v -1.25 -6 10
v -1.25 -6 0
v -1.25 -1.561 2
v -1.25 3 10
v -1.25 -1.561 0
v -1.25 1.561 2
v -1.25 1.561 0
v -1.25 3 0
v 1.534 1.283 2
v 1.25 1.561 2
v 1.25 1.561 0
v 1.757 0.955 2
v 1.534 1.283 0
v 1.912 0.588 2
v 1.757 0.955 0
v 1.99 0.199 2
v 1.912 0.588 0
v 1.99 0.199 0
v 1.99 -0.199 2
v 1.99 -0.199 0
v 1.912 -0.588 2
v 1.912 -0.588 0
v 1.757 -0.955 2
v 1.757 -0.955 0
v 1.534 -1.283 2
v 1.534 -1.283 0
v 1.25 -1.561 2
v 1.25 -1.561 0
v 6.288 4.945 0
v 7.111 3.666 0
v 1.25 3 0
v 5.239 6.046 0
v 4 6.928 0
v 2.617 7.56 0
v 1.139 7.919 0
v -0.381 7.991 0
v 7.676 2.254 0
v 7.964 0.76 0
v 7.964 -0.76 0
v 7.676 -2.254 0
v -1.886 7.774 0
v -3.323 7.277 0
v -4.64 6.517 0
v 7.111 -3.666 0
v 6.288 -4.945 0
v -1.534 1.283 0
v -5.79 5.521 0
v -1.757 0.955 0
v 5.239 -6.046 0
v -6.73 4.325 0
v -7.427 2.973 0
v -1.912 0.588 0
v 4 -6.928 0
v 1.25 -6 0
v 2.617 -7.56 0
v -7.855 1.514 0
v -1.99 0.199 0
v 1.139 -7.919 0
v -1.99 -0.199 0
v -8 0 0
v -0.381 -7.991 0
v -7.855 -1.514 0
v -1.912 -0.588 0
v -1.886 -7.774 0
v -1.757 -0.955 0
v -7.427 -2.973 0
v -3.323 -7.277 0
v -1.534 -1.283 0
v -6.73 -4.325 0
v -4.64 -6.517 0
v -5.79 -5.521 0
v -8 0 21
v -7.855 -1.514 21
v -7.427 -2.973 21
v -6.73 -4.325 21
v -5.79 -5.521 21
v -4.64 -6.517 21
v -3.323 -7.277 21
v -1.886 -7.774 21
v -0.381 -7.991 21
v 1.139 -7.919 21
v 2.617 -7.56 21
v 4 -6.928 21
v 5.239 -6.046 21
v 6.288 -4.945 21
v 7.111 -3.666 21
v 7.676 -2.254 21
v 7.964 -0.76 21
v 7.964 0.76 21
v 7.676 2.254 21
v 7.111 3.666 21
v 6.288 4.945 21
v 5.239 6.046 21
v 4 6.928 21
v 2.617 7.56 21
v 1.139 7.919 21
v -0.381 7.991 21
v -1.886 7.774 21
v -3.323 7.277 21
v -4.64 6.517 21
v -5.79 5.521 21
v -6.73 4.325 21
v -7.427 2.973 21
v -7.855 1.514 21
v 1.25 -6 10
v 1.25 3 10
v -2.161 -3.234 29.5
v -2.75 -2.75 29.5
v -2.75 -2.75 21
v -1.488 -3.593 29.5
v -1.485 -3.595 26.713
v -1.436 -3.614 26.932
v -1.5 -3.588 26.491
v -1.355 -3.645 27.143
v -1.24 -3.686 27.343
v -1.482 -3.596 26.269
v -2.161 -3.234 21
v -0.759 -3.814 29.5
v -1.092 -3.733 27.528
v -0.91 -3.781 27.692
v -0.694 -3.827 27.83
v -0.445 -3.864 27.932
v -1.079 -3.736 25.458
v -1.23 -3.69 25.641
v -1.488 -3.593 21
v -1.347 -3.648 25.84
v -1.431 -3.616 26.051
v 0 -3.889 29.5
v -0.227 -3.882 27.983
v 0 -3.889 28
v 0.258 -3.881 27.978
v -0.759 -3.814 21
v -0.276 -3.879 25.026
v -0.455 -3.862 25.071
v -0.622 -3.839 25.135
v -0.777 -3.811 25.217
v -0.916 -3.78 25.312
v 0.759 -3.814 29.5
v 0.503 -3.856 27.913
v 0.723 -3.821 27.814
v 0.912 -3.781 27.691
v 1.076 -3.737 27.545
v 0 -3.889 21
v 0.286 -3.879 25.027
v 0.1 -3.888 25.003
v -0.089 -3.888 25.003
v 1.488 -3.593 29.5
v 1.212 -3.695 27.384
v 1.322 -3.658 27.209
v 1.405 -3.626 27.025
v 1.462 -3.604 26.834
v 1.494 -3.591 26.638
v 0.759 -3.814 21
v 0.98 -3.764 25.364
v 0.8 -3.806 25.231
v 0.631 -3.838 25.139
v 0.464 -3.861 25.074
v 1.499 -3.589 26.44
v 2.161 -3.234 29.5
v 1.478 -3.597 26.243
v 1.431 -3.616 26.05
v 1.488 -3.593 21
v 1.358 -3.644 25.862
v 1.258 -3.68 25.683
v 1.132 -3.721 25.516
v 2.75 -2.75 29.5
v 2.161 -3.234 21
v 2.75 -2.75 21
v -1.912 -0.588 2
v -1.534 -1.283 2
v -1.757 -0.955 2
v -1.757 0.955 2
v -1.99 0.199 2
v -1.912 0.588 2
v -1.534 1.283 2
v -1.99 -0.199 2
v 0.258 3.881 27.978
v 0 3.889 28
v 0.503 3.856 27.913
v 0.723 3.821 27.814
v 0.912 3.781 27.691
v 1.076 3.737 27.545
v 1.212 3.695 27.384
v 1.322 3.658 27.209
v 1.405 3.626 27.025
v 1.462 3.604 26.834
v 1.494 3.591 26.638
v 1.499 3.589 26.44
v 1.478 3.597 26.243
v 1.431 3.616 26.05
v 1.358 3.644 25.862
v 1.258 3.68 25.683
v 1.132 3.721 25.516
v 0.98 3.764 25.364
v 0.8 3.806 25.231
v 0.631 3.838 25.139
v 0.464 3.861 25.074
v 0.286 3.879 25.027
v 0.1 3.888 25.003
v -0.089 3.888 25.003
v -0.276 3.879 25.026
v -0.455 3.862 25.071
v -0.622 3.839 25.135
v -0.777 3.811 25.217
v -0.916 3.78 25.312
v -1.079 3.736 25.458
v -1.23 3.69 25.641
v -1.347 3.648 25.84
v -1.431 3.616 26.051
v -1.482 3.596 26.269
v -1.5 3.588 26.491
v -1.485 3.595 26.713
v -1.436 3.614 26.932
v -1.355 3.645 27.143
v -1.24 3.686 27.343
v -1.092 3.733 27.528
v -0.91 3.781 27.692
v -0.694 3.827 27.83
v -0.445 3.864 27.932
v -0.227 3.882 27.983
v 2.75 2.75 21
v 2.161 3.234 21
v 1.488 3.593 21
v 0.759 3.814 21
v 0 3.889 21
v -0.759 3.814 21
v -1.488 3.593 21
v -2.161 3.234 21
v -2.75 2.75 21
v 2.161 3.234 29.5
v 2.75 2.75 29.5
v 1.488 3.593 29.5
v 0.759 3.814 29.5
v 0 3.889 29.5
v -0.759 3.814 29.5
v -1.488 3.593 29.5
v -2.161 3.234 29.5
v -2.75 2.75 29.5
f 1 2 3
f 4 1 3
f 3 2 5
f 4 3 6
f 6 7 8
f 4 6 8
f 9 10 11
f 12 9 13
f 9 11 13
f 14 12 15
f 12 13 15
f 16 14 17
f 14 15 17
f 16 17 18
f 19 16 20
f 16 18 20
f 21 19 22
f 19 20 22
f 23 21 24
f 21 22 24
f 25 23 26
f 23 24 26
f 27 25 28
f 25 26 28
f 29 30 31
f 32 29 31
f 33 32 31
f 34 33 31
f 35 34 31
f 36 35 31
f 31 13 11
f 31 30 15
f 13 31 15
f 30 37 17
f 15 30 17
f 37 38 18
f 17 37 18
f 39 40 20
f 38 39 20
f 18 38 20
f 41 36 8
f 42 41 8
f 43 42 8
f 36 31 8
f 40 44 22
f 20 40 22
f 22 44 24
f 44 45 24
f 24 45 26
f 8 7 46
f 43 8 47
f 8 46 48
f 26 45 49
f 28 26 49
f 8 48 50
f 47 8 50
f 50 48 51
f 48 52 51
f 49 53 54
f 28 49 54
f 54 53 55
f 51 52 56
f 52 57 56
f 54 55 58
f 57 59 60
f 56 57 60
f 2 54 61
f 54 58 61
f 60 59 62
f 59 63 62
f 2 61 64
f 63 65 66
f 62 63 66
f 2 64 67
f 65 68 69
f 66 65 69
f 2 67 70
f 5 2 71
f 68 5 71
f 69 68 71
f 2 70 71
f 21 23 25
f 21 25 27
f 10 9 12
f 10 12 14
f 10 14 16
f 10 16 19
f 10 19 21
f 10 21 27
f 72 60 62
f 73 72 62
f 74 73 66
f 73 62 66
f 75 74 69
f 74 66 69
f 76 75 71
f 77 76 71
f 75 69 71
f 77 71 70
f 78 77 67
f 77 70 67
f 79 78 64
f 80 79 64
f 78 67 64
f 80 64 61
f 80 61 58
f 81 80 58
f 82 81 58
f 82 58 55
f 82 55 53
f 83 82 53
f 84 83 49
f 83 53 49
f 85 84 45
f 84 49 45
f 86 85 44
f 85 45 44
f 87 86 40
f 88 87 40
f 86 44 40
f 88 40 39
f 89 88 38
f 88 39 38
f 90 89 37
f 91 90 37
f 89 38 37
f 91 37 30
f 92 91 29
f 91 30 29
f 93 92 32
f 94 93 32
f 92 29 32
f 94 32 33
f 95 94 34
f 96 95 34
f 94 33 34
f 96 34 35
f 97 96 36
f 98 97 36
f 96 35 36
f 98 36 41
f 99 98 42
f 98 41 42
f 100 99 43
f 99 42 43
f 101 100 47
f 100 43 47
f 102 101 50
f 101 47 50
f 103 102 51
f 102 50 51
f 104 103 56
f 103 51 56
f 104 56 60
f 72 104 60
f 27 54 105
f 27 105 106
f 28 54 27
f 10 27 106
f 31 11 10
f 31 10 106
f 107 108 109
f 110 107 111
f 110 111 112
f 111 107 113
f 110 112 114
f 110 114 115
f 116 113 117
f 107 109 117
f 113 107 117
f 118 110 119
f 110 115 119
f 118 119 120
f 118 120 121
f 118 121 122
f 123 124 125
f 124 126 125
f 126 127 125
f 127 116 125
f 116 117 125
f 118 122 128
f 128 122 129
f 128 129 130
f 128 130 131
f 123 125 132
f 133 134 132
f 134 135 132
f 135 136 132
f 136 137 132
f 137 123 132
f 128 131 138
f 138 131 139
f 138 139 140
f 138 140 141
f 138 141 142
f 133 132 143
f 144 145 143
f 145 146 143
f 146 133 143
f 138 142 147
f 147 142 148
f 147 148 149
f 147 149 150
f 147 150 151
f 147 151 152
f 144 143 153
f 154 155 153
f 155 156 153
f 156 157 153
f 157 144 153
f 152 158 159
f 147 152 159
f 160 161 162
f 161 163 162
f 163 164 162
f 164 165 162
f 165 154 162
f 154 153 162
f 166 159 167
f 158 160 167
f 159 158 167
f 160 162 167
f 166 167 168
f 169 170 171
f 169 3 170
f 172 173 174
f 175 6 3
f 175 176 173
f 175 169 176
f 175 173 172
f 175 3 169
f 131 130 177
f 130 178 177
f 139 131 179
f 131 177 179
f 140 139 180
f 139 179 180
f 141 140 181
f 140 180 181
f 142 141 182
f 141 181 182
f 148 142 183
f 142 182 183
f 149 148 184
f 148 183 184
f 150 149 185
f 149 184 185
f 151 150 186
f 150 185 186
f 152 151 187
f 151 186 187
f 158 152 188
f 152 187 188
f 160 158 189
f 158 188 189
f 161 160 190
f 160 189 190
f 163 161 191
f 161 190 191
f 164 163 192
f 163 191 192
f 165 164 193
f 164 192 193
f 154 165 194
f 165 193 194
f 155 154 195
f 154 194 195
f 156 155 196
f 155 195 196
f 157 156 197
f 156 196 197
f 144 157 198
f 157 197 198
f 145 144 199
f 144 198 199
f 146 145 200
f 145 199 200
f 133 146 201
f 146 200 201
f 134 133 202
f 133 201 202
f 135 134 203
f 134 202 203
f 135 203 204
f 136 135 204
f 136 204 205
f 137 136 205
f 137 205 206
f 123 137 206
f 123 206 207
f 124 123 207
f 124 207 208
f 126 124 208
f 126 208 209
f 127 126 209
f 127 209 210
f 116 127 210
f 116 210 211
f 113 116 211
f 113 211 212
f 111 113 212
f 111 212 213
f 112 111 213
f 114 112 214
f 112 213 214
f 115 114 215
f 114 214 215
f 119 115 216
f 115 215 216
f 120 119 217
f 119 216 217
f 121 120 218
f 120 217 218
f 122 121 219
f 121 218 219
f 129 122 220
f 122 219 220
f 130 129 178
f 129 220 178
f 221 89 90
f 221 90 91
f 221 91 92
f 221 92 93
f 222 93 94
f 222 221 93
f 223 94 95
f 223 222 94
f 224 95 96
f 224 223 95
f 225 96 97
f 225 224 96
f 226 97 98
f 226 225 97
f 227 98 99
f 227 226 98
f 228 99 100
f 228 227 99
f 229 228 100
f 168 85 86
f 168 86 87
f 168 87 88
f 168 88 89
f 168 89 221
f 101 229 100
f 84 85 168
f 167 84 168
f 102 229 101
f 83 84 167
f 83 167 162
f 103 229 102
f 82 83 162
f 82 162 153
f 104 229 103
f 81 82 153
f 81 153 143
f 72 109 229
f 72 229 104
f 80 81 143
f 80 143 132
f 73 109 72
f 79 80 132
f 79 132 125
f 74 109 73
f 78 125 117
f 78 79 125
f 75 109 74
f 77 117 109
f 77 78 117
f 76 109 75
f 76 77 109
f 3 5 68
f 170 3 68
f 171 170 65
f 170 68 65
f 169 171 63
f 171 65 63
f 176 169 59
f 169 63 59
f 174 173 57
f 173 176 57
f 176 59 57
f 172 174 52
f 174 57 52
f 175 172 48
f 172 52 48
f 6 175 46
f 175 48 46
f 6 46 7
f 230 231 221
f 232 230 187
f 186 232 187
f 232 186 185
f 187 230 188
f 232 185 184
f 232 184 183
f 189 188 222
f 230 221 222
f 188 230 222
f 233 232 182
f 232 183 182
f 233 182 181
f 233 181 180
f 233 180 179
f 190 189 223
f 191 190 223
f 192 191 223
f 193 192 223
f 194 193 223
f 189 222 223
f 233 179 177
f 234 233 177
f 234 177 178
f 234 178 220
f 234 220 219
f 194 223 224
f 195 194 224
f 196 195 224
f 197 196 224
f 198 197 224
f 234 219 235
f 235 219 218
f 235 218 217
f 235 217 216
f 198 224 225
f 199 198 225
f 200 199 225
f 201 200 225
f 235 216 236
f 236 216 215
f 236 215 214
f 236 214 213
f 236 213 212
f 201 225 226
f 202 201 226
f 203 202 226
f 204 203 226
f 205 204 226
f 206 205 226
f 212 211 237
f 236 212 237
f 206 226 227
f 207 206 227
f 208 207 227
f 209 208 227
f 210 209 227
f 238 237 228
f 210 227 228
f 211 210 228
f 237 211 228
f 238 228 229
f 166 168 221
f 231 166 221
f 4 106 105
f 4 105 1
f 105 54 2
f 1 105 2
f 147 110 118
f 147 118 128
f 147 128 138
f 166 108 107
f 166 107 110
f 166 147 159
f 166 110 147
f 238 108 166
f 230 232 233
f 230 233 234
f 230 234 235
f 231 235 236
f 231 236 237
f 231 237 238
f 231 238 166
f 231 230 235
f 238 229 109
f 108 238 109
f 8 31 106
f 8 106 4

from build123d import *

# Parameters (mm, degrees)
SKETCH1_R           = 8
BOSS_EXTRUDE1_DEPTH = 21
SKETCH2_W           = 2.5
SKETCH2_H           = 9
CUT_EXTRUDE1_DEPTH  = 10
SKETCH3_R           = 2
CUT_EXTRUDE2_DEPTH  = 2
BOSS_EXTRUDE2_DEPTH = 8.5
SKETCH5_R           = 1.5
CUT_EXTRUDE3_DEPTH  = 4.25


with BuildPart() as part:
    # Sketch1 → Boss-Extrude1 (new body)
    with BuildSketch(Plane.XY):
        with Locations(Location((0, 0, 0), (0, 0, 180))):
            Circle(SKETCH1_R)
    extrude(amount=BOSS_EXTRUDE1_DEPTH)

    # Sketch2 → Cut-Extrude1 (cut)
    with BuildSketch(Plane(origin=(0, 0, 0), x_dir=(-1, 0, 0), z_dir=(0, 0, -1))):
        with Locations((0, -1.5)):
            Rectangle(SKETCH2_W, SKETCH2_H)
    extrude(amount=-CUT_EXTRUDE1_DEPTH, mode=Mode.SUBTRACT)

    # Sketch3 → Cut-Extrude2 (cut)
    with BuildSketch(Plane(origin=(0, 0, 0), x_dir=(-1, 0, 0), z_dir=(0, 0, -1))):
        Circle(SKETCH3_R)
    extrude(amount=-CUT_EXTRUDE2_DEPTH, mode=Mode.SUBTRACT)

    # Sketch4 → Boss-Extrude2 (add)
    with BuildSketch(Plane.XY.offset(21)):
        with BuildLine():
            Line((-2.75, 2.75), (-2.75, -2.75))
            ThreePointArc((-2.75, -2.75), (0, -3.889087297), (2.75, -2.75))
            Line((2.75, -2.75), (2.75, 2.75))
            ThreePointArc((2.75, 2.75), (0, 3.889087297), (-2.75, 2.75))
        make_face()
    extrude(amount=BOSS_EXTRUDE2_DEPTH)

    # Sketch5 → Cut-Extrude3 (cut, symmetric)
    with BuildSketch(Plane(origin=(0, 0, 0), x_dir=(1, 0, 0), z_dir=(0, 1, 0))):
        with Locations(Location((0, -26.5, 0), (0, 0, 270))):
            Circle(SKETCH5_R)
    extrude(amount=CUT_EXTRUDE3_DEPTH, both=True, mode=Mode.SUBTRACT)


solid = part.part
